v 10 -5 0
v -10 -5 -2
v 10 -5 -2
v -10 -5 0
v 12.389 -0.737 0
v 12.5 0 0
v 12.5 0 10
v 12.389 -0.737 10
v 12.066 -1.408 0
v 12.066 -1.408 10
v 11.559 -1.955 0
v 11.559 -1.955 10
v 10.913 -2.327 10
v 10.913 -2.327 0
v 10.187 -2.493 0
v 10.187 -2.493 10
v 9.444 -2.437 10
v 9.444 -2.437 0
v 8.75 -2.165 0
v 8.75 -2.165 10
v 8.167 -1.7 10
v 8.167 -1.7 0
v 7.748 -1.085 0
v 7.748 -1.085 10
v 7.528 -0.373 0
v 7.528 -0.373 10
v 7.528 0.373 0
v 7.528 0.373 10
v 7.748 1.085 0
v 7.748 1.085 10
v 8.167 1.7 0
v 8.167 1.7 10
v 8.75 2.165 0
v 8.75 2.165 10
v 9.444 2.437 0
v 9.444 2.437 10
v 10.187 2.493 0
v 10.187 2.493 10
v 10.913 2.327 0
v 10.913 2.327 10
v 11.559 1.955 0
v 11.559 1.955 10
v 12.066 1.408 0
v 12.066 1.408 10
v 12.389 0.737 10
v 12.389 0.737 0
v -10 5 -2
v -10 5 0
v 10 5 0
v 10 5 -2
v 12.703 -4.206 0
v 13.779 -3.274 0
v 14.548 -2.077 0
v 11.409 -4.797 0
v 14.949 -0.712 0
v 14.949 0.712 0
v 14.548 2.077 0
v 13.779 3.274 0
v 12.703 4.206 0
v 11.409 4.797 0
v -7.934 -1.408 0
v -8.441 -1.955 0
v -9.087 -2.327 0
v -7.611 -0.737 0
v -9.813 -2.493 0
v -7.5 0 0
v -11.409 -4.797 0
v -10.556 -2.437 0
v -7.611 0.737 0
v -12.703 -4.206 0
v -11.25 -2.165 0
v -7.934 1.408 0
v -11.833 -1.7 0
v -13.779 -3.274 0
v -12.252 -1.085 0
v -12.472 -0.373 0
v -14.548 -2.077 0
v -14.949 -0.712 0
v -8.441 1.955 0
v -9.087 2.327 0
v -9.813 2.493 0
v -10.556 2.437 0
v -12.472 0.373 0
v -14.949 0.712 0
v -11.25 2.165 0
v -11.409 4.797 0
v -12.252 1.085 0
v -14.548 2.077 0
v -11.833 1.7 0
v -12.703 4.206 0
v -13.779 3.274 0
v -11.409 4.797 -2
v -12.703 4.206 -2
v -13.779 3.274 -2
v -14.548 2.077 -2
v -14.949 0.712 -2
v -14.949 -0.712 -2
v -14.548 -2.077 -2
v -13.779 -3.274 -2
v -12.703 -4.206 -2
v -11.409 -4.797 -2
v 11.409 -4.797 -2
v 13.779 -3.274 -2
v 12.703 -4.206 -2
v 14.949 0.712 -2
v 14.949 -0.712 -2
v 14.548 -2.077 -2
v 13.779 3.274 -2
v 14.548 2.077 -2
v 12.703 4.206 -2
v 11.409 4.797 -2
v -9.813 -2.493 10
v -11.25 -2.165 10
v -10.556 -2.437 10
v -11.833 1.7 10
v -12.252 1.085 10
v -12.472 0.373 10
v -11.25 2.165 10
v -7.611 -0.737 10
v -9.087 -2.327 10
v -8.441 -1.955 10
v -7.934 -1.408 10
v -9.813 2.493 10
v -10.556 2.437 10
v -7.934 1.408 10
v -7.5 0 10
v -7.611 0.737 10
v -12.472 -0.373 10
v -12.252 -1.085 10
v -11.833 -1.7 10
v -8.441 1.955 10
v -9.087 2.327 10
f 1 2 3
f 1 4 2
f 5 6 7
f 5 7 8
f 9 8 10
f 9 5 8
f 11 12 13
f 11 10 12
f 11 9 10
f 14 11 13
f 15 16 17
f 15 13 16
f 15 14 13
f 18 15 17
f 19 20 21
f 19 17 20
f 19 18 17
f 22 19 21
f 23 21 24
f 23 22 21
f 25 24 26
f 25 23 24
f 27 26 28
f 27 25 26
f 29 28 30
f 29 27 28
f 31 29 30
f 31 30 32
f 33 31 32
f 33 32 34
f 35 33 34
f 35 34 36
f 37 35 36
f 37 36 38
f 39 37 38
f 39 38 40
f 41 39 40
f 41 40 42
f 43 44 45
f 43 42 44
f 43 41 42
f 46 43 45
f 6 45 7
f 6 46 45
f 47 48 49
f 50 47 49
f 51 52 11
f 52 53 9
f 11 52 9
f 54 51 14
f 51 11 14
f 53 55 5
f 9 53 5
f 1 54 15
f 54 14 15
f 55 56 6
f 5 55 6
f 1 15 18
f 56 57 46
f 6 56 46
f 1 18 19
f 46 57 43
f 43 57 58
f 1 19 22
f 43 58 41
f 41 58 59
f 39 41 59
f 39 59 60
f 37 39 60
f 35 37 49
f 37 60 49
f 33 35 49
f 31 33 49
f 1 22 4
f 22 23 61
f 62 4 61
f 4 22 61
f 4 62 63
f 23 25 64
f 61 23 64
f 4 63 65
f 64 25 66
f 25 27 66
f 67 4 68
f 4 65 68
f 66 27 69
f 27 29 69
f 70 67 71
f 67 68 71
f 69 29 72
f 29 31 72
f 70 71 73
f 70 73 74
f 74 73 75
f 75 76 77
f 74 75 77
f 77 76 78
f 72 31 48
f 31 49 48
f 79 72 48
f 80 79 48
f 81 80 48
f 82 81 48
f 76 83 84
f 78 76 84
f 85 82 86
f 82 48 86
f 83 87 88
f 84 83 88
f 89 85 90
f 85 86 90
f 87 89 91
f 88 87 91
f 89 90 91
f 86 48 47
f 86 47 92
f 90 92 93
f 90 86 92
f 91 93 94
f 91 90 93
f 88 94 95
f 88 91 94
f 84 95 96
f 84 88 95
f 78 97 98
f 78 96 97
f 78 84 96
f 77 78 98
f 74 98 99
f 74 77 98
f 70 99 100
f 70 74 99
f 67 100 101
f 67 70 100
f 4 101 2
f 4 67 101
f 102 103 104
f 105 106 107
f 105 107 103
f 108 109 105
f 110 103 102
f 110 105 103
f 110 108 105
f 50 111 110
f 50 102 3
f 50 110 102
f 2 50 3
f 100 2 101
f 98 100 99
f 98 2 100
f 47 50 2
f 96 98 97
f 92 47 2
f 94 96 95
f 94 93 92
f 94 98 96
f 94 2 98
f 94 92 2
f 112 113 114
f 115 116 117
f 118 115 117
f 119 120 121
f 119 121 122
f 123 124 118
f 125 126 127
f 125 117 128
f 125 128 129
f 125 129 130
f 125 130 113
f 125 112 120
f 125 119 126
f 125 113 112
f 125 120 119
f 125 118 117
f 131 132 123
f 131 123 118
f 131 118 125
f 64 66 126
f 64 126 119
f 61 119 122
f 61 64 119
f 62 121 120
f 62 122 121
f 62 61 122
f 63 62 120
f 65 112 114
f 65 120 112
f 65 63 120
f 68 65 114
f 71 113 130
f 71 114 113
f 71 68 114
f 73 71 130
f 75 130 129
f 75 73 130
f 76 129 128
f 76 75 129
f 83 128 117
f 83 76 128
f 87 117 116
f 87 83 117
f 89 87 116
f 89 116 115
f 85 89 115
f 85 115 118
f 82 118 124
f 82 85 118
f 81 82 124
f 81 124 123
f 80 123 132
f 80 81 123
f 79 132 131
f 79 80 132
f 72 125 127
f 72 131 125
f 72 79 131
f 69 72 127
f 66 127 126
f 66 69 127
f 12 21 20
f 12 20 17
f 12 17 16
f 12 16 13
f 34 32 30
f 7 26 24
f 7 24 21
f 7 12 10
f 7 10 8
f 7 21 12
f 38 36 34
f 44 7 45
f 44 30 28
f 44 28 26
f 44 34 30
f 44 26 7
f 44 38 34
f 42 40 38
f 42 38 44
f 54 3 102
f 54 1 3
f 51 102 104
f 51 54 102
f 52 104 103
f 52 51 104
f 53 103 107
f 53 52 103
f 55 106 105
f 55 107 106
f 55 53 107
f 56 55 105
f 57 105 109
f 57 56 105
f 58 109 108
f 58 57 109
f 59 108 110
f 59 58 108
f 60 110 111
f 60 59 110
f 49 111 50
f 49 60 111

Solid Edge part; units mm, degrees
sketch "Sketch1" plane through (0, 0, 0) normal (0, 0, 1) x (1, 0, 0)
  line L0 (-10, 5) -> (10, 5)
  line L1 (-10, -5) -> (10, -5)
  arc A0 (-10, -5) -> (-10, 5) centre (-10, 0) cw
  arc A1 (10, 5) -> (10, -5) centre (10, 0) cw
extrude "Protrusion1" add sketch "Sketch1" against normal blind 2
sketch "Sketch2" plane through (0, 0, 0) normal (0, 0, 1) x (1, 0, 0)
  circle A0 centre (-10, 0) radius 2.5
  circle A1 centre (10, 0) radius 2.5
  dimension "D1" = 5
  dimension "D2" = 10
  dimension "D3" = 20
extrude "ExtrudedProtrusion_2" add sketch "Sketch2" along normal blind 10
